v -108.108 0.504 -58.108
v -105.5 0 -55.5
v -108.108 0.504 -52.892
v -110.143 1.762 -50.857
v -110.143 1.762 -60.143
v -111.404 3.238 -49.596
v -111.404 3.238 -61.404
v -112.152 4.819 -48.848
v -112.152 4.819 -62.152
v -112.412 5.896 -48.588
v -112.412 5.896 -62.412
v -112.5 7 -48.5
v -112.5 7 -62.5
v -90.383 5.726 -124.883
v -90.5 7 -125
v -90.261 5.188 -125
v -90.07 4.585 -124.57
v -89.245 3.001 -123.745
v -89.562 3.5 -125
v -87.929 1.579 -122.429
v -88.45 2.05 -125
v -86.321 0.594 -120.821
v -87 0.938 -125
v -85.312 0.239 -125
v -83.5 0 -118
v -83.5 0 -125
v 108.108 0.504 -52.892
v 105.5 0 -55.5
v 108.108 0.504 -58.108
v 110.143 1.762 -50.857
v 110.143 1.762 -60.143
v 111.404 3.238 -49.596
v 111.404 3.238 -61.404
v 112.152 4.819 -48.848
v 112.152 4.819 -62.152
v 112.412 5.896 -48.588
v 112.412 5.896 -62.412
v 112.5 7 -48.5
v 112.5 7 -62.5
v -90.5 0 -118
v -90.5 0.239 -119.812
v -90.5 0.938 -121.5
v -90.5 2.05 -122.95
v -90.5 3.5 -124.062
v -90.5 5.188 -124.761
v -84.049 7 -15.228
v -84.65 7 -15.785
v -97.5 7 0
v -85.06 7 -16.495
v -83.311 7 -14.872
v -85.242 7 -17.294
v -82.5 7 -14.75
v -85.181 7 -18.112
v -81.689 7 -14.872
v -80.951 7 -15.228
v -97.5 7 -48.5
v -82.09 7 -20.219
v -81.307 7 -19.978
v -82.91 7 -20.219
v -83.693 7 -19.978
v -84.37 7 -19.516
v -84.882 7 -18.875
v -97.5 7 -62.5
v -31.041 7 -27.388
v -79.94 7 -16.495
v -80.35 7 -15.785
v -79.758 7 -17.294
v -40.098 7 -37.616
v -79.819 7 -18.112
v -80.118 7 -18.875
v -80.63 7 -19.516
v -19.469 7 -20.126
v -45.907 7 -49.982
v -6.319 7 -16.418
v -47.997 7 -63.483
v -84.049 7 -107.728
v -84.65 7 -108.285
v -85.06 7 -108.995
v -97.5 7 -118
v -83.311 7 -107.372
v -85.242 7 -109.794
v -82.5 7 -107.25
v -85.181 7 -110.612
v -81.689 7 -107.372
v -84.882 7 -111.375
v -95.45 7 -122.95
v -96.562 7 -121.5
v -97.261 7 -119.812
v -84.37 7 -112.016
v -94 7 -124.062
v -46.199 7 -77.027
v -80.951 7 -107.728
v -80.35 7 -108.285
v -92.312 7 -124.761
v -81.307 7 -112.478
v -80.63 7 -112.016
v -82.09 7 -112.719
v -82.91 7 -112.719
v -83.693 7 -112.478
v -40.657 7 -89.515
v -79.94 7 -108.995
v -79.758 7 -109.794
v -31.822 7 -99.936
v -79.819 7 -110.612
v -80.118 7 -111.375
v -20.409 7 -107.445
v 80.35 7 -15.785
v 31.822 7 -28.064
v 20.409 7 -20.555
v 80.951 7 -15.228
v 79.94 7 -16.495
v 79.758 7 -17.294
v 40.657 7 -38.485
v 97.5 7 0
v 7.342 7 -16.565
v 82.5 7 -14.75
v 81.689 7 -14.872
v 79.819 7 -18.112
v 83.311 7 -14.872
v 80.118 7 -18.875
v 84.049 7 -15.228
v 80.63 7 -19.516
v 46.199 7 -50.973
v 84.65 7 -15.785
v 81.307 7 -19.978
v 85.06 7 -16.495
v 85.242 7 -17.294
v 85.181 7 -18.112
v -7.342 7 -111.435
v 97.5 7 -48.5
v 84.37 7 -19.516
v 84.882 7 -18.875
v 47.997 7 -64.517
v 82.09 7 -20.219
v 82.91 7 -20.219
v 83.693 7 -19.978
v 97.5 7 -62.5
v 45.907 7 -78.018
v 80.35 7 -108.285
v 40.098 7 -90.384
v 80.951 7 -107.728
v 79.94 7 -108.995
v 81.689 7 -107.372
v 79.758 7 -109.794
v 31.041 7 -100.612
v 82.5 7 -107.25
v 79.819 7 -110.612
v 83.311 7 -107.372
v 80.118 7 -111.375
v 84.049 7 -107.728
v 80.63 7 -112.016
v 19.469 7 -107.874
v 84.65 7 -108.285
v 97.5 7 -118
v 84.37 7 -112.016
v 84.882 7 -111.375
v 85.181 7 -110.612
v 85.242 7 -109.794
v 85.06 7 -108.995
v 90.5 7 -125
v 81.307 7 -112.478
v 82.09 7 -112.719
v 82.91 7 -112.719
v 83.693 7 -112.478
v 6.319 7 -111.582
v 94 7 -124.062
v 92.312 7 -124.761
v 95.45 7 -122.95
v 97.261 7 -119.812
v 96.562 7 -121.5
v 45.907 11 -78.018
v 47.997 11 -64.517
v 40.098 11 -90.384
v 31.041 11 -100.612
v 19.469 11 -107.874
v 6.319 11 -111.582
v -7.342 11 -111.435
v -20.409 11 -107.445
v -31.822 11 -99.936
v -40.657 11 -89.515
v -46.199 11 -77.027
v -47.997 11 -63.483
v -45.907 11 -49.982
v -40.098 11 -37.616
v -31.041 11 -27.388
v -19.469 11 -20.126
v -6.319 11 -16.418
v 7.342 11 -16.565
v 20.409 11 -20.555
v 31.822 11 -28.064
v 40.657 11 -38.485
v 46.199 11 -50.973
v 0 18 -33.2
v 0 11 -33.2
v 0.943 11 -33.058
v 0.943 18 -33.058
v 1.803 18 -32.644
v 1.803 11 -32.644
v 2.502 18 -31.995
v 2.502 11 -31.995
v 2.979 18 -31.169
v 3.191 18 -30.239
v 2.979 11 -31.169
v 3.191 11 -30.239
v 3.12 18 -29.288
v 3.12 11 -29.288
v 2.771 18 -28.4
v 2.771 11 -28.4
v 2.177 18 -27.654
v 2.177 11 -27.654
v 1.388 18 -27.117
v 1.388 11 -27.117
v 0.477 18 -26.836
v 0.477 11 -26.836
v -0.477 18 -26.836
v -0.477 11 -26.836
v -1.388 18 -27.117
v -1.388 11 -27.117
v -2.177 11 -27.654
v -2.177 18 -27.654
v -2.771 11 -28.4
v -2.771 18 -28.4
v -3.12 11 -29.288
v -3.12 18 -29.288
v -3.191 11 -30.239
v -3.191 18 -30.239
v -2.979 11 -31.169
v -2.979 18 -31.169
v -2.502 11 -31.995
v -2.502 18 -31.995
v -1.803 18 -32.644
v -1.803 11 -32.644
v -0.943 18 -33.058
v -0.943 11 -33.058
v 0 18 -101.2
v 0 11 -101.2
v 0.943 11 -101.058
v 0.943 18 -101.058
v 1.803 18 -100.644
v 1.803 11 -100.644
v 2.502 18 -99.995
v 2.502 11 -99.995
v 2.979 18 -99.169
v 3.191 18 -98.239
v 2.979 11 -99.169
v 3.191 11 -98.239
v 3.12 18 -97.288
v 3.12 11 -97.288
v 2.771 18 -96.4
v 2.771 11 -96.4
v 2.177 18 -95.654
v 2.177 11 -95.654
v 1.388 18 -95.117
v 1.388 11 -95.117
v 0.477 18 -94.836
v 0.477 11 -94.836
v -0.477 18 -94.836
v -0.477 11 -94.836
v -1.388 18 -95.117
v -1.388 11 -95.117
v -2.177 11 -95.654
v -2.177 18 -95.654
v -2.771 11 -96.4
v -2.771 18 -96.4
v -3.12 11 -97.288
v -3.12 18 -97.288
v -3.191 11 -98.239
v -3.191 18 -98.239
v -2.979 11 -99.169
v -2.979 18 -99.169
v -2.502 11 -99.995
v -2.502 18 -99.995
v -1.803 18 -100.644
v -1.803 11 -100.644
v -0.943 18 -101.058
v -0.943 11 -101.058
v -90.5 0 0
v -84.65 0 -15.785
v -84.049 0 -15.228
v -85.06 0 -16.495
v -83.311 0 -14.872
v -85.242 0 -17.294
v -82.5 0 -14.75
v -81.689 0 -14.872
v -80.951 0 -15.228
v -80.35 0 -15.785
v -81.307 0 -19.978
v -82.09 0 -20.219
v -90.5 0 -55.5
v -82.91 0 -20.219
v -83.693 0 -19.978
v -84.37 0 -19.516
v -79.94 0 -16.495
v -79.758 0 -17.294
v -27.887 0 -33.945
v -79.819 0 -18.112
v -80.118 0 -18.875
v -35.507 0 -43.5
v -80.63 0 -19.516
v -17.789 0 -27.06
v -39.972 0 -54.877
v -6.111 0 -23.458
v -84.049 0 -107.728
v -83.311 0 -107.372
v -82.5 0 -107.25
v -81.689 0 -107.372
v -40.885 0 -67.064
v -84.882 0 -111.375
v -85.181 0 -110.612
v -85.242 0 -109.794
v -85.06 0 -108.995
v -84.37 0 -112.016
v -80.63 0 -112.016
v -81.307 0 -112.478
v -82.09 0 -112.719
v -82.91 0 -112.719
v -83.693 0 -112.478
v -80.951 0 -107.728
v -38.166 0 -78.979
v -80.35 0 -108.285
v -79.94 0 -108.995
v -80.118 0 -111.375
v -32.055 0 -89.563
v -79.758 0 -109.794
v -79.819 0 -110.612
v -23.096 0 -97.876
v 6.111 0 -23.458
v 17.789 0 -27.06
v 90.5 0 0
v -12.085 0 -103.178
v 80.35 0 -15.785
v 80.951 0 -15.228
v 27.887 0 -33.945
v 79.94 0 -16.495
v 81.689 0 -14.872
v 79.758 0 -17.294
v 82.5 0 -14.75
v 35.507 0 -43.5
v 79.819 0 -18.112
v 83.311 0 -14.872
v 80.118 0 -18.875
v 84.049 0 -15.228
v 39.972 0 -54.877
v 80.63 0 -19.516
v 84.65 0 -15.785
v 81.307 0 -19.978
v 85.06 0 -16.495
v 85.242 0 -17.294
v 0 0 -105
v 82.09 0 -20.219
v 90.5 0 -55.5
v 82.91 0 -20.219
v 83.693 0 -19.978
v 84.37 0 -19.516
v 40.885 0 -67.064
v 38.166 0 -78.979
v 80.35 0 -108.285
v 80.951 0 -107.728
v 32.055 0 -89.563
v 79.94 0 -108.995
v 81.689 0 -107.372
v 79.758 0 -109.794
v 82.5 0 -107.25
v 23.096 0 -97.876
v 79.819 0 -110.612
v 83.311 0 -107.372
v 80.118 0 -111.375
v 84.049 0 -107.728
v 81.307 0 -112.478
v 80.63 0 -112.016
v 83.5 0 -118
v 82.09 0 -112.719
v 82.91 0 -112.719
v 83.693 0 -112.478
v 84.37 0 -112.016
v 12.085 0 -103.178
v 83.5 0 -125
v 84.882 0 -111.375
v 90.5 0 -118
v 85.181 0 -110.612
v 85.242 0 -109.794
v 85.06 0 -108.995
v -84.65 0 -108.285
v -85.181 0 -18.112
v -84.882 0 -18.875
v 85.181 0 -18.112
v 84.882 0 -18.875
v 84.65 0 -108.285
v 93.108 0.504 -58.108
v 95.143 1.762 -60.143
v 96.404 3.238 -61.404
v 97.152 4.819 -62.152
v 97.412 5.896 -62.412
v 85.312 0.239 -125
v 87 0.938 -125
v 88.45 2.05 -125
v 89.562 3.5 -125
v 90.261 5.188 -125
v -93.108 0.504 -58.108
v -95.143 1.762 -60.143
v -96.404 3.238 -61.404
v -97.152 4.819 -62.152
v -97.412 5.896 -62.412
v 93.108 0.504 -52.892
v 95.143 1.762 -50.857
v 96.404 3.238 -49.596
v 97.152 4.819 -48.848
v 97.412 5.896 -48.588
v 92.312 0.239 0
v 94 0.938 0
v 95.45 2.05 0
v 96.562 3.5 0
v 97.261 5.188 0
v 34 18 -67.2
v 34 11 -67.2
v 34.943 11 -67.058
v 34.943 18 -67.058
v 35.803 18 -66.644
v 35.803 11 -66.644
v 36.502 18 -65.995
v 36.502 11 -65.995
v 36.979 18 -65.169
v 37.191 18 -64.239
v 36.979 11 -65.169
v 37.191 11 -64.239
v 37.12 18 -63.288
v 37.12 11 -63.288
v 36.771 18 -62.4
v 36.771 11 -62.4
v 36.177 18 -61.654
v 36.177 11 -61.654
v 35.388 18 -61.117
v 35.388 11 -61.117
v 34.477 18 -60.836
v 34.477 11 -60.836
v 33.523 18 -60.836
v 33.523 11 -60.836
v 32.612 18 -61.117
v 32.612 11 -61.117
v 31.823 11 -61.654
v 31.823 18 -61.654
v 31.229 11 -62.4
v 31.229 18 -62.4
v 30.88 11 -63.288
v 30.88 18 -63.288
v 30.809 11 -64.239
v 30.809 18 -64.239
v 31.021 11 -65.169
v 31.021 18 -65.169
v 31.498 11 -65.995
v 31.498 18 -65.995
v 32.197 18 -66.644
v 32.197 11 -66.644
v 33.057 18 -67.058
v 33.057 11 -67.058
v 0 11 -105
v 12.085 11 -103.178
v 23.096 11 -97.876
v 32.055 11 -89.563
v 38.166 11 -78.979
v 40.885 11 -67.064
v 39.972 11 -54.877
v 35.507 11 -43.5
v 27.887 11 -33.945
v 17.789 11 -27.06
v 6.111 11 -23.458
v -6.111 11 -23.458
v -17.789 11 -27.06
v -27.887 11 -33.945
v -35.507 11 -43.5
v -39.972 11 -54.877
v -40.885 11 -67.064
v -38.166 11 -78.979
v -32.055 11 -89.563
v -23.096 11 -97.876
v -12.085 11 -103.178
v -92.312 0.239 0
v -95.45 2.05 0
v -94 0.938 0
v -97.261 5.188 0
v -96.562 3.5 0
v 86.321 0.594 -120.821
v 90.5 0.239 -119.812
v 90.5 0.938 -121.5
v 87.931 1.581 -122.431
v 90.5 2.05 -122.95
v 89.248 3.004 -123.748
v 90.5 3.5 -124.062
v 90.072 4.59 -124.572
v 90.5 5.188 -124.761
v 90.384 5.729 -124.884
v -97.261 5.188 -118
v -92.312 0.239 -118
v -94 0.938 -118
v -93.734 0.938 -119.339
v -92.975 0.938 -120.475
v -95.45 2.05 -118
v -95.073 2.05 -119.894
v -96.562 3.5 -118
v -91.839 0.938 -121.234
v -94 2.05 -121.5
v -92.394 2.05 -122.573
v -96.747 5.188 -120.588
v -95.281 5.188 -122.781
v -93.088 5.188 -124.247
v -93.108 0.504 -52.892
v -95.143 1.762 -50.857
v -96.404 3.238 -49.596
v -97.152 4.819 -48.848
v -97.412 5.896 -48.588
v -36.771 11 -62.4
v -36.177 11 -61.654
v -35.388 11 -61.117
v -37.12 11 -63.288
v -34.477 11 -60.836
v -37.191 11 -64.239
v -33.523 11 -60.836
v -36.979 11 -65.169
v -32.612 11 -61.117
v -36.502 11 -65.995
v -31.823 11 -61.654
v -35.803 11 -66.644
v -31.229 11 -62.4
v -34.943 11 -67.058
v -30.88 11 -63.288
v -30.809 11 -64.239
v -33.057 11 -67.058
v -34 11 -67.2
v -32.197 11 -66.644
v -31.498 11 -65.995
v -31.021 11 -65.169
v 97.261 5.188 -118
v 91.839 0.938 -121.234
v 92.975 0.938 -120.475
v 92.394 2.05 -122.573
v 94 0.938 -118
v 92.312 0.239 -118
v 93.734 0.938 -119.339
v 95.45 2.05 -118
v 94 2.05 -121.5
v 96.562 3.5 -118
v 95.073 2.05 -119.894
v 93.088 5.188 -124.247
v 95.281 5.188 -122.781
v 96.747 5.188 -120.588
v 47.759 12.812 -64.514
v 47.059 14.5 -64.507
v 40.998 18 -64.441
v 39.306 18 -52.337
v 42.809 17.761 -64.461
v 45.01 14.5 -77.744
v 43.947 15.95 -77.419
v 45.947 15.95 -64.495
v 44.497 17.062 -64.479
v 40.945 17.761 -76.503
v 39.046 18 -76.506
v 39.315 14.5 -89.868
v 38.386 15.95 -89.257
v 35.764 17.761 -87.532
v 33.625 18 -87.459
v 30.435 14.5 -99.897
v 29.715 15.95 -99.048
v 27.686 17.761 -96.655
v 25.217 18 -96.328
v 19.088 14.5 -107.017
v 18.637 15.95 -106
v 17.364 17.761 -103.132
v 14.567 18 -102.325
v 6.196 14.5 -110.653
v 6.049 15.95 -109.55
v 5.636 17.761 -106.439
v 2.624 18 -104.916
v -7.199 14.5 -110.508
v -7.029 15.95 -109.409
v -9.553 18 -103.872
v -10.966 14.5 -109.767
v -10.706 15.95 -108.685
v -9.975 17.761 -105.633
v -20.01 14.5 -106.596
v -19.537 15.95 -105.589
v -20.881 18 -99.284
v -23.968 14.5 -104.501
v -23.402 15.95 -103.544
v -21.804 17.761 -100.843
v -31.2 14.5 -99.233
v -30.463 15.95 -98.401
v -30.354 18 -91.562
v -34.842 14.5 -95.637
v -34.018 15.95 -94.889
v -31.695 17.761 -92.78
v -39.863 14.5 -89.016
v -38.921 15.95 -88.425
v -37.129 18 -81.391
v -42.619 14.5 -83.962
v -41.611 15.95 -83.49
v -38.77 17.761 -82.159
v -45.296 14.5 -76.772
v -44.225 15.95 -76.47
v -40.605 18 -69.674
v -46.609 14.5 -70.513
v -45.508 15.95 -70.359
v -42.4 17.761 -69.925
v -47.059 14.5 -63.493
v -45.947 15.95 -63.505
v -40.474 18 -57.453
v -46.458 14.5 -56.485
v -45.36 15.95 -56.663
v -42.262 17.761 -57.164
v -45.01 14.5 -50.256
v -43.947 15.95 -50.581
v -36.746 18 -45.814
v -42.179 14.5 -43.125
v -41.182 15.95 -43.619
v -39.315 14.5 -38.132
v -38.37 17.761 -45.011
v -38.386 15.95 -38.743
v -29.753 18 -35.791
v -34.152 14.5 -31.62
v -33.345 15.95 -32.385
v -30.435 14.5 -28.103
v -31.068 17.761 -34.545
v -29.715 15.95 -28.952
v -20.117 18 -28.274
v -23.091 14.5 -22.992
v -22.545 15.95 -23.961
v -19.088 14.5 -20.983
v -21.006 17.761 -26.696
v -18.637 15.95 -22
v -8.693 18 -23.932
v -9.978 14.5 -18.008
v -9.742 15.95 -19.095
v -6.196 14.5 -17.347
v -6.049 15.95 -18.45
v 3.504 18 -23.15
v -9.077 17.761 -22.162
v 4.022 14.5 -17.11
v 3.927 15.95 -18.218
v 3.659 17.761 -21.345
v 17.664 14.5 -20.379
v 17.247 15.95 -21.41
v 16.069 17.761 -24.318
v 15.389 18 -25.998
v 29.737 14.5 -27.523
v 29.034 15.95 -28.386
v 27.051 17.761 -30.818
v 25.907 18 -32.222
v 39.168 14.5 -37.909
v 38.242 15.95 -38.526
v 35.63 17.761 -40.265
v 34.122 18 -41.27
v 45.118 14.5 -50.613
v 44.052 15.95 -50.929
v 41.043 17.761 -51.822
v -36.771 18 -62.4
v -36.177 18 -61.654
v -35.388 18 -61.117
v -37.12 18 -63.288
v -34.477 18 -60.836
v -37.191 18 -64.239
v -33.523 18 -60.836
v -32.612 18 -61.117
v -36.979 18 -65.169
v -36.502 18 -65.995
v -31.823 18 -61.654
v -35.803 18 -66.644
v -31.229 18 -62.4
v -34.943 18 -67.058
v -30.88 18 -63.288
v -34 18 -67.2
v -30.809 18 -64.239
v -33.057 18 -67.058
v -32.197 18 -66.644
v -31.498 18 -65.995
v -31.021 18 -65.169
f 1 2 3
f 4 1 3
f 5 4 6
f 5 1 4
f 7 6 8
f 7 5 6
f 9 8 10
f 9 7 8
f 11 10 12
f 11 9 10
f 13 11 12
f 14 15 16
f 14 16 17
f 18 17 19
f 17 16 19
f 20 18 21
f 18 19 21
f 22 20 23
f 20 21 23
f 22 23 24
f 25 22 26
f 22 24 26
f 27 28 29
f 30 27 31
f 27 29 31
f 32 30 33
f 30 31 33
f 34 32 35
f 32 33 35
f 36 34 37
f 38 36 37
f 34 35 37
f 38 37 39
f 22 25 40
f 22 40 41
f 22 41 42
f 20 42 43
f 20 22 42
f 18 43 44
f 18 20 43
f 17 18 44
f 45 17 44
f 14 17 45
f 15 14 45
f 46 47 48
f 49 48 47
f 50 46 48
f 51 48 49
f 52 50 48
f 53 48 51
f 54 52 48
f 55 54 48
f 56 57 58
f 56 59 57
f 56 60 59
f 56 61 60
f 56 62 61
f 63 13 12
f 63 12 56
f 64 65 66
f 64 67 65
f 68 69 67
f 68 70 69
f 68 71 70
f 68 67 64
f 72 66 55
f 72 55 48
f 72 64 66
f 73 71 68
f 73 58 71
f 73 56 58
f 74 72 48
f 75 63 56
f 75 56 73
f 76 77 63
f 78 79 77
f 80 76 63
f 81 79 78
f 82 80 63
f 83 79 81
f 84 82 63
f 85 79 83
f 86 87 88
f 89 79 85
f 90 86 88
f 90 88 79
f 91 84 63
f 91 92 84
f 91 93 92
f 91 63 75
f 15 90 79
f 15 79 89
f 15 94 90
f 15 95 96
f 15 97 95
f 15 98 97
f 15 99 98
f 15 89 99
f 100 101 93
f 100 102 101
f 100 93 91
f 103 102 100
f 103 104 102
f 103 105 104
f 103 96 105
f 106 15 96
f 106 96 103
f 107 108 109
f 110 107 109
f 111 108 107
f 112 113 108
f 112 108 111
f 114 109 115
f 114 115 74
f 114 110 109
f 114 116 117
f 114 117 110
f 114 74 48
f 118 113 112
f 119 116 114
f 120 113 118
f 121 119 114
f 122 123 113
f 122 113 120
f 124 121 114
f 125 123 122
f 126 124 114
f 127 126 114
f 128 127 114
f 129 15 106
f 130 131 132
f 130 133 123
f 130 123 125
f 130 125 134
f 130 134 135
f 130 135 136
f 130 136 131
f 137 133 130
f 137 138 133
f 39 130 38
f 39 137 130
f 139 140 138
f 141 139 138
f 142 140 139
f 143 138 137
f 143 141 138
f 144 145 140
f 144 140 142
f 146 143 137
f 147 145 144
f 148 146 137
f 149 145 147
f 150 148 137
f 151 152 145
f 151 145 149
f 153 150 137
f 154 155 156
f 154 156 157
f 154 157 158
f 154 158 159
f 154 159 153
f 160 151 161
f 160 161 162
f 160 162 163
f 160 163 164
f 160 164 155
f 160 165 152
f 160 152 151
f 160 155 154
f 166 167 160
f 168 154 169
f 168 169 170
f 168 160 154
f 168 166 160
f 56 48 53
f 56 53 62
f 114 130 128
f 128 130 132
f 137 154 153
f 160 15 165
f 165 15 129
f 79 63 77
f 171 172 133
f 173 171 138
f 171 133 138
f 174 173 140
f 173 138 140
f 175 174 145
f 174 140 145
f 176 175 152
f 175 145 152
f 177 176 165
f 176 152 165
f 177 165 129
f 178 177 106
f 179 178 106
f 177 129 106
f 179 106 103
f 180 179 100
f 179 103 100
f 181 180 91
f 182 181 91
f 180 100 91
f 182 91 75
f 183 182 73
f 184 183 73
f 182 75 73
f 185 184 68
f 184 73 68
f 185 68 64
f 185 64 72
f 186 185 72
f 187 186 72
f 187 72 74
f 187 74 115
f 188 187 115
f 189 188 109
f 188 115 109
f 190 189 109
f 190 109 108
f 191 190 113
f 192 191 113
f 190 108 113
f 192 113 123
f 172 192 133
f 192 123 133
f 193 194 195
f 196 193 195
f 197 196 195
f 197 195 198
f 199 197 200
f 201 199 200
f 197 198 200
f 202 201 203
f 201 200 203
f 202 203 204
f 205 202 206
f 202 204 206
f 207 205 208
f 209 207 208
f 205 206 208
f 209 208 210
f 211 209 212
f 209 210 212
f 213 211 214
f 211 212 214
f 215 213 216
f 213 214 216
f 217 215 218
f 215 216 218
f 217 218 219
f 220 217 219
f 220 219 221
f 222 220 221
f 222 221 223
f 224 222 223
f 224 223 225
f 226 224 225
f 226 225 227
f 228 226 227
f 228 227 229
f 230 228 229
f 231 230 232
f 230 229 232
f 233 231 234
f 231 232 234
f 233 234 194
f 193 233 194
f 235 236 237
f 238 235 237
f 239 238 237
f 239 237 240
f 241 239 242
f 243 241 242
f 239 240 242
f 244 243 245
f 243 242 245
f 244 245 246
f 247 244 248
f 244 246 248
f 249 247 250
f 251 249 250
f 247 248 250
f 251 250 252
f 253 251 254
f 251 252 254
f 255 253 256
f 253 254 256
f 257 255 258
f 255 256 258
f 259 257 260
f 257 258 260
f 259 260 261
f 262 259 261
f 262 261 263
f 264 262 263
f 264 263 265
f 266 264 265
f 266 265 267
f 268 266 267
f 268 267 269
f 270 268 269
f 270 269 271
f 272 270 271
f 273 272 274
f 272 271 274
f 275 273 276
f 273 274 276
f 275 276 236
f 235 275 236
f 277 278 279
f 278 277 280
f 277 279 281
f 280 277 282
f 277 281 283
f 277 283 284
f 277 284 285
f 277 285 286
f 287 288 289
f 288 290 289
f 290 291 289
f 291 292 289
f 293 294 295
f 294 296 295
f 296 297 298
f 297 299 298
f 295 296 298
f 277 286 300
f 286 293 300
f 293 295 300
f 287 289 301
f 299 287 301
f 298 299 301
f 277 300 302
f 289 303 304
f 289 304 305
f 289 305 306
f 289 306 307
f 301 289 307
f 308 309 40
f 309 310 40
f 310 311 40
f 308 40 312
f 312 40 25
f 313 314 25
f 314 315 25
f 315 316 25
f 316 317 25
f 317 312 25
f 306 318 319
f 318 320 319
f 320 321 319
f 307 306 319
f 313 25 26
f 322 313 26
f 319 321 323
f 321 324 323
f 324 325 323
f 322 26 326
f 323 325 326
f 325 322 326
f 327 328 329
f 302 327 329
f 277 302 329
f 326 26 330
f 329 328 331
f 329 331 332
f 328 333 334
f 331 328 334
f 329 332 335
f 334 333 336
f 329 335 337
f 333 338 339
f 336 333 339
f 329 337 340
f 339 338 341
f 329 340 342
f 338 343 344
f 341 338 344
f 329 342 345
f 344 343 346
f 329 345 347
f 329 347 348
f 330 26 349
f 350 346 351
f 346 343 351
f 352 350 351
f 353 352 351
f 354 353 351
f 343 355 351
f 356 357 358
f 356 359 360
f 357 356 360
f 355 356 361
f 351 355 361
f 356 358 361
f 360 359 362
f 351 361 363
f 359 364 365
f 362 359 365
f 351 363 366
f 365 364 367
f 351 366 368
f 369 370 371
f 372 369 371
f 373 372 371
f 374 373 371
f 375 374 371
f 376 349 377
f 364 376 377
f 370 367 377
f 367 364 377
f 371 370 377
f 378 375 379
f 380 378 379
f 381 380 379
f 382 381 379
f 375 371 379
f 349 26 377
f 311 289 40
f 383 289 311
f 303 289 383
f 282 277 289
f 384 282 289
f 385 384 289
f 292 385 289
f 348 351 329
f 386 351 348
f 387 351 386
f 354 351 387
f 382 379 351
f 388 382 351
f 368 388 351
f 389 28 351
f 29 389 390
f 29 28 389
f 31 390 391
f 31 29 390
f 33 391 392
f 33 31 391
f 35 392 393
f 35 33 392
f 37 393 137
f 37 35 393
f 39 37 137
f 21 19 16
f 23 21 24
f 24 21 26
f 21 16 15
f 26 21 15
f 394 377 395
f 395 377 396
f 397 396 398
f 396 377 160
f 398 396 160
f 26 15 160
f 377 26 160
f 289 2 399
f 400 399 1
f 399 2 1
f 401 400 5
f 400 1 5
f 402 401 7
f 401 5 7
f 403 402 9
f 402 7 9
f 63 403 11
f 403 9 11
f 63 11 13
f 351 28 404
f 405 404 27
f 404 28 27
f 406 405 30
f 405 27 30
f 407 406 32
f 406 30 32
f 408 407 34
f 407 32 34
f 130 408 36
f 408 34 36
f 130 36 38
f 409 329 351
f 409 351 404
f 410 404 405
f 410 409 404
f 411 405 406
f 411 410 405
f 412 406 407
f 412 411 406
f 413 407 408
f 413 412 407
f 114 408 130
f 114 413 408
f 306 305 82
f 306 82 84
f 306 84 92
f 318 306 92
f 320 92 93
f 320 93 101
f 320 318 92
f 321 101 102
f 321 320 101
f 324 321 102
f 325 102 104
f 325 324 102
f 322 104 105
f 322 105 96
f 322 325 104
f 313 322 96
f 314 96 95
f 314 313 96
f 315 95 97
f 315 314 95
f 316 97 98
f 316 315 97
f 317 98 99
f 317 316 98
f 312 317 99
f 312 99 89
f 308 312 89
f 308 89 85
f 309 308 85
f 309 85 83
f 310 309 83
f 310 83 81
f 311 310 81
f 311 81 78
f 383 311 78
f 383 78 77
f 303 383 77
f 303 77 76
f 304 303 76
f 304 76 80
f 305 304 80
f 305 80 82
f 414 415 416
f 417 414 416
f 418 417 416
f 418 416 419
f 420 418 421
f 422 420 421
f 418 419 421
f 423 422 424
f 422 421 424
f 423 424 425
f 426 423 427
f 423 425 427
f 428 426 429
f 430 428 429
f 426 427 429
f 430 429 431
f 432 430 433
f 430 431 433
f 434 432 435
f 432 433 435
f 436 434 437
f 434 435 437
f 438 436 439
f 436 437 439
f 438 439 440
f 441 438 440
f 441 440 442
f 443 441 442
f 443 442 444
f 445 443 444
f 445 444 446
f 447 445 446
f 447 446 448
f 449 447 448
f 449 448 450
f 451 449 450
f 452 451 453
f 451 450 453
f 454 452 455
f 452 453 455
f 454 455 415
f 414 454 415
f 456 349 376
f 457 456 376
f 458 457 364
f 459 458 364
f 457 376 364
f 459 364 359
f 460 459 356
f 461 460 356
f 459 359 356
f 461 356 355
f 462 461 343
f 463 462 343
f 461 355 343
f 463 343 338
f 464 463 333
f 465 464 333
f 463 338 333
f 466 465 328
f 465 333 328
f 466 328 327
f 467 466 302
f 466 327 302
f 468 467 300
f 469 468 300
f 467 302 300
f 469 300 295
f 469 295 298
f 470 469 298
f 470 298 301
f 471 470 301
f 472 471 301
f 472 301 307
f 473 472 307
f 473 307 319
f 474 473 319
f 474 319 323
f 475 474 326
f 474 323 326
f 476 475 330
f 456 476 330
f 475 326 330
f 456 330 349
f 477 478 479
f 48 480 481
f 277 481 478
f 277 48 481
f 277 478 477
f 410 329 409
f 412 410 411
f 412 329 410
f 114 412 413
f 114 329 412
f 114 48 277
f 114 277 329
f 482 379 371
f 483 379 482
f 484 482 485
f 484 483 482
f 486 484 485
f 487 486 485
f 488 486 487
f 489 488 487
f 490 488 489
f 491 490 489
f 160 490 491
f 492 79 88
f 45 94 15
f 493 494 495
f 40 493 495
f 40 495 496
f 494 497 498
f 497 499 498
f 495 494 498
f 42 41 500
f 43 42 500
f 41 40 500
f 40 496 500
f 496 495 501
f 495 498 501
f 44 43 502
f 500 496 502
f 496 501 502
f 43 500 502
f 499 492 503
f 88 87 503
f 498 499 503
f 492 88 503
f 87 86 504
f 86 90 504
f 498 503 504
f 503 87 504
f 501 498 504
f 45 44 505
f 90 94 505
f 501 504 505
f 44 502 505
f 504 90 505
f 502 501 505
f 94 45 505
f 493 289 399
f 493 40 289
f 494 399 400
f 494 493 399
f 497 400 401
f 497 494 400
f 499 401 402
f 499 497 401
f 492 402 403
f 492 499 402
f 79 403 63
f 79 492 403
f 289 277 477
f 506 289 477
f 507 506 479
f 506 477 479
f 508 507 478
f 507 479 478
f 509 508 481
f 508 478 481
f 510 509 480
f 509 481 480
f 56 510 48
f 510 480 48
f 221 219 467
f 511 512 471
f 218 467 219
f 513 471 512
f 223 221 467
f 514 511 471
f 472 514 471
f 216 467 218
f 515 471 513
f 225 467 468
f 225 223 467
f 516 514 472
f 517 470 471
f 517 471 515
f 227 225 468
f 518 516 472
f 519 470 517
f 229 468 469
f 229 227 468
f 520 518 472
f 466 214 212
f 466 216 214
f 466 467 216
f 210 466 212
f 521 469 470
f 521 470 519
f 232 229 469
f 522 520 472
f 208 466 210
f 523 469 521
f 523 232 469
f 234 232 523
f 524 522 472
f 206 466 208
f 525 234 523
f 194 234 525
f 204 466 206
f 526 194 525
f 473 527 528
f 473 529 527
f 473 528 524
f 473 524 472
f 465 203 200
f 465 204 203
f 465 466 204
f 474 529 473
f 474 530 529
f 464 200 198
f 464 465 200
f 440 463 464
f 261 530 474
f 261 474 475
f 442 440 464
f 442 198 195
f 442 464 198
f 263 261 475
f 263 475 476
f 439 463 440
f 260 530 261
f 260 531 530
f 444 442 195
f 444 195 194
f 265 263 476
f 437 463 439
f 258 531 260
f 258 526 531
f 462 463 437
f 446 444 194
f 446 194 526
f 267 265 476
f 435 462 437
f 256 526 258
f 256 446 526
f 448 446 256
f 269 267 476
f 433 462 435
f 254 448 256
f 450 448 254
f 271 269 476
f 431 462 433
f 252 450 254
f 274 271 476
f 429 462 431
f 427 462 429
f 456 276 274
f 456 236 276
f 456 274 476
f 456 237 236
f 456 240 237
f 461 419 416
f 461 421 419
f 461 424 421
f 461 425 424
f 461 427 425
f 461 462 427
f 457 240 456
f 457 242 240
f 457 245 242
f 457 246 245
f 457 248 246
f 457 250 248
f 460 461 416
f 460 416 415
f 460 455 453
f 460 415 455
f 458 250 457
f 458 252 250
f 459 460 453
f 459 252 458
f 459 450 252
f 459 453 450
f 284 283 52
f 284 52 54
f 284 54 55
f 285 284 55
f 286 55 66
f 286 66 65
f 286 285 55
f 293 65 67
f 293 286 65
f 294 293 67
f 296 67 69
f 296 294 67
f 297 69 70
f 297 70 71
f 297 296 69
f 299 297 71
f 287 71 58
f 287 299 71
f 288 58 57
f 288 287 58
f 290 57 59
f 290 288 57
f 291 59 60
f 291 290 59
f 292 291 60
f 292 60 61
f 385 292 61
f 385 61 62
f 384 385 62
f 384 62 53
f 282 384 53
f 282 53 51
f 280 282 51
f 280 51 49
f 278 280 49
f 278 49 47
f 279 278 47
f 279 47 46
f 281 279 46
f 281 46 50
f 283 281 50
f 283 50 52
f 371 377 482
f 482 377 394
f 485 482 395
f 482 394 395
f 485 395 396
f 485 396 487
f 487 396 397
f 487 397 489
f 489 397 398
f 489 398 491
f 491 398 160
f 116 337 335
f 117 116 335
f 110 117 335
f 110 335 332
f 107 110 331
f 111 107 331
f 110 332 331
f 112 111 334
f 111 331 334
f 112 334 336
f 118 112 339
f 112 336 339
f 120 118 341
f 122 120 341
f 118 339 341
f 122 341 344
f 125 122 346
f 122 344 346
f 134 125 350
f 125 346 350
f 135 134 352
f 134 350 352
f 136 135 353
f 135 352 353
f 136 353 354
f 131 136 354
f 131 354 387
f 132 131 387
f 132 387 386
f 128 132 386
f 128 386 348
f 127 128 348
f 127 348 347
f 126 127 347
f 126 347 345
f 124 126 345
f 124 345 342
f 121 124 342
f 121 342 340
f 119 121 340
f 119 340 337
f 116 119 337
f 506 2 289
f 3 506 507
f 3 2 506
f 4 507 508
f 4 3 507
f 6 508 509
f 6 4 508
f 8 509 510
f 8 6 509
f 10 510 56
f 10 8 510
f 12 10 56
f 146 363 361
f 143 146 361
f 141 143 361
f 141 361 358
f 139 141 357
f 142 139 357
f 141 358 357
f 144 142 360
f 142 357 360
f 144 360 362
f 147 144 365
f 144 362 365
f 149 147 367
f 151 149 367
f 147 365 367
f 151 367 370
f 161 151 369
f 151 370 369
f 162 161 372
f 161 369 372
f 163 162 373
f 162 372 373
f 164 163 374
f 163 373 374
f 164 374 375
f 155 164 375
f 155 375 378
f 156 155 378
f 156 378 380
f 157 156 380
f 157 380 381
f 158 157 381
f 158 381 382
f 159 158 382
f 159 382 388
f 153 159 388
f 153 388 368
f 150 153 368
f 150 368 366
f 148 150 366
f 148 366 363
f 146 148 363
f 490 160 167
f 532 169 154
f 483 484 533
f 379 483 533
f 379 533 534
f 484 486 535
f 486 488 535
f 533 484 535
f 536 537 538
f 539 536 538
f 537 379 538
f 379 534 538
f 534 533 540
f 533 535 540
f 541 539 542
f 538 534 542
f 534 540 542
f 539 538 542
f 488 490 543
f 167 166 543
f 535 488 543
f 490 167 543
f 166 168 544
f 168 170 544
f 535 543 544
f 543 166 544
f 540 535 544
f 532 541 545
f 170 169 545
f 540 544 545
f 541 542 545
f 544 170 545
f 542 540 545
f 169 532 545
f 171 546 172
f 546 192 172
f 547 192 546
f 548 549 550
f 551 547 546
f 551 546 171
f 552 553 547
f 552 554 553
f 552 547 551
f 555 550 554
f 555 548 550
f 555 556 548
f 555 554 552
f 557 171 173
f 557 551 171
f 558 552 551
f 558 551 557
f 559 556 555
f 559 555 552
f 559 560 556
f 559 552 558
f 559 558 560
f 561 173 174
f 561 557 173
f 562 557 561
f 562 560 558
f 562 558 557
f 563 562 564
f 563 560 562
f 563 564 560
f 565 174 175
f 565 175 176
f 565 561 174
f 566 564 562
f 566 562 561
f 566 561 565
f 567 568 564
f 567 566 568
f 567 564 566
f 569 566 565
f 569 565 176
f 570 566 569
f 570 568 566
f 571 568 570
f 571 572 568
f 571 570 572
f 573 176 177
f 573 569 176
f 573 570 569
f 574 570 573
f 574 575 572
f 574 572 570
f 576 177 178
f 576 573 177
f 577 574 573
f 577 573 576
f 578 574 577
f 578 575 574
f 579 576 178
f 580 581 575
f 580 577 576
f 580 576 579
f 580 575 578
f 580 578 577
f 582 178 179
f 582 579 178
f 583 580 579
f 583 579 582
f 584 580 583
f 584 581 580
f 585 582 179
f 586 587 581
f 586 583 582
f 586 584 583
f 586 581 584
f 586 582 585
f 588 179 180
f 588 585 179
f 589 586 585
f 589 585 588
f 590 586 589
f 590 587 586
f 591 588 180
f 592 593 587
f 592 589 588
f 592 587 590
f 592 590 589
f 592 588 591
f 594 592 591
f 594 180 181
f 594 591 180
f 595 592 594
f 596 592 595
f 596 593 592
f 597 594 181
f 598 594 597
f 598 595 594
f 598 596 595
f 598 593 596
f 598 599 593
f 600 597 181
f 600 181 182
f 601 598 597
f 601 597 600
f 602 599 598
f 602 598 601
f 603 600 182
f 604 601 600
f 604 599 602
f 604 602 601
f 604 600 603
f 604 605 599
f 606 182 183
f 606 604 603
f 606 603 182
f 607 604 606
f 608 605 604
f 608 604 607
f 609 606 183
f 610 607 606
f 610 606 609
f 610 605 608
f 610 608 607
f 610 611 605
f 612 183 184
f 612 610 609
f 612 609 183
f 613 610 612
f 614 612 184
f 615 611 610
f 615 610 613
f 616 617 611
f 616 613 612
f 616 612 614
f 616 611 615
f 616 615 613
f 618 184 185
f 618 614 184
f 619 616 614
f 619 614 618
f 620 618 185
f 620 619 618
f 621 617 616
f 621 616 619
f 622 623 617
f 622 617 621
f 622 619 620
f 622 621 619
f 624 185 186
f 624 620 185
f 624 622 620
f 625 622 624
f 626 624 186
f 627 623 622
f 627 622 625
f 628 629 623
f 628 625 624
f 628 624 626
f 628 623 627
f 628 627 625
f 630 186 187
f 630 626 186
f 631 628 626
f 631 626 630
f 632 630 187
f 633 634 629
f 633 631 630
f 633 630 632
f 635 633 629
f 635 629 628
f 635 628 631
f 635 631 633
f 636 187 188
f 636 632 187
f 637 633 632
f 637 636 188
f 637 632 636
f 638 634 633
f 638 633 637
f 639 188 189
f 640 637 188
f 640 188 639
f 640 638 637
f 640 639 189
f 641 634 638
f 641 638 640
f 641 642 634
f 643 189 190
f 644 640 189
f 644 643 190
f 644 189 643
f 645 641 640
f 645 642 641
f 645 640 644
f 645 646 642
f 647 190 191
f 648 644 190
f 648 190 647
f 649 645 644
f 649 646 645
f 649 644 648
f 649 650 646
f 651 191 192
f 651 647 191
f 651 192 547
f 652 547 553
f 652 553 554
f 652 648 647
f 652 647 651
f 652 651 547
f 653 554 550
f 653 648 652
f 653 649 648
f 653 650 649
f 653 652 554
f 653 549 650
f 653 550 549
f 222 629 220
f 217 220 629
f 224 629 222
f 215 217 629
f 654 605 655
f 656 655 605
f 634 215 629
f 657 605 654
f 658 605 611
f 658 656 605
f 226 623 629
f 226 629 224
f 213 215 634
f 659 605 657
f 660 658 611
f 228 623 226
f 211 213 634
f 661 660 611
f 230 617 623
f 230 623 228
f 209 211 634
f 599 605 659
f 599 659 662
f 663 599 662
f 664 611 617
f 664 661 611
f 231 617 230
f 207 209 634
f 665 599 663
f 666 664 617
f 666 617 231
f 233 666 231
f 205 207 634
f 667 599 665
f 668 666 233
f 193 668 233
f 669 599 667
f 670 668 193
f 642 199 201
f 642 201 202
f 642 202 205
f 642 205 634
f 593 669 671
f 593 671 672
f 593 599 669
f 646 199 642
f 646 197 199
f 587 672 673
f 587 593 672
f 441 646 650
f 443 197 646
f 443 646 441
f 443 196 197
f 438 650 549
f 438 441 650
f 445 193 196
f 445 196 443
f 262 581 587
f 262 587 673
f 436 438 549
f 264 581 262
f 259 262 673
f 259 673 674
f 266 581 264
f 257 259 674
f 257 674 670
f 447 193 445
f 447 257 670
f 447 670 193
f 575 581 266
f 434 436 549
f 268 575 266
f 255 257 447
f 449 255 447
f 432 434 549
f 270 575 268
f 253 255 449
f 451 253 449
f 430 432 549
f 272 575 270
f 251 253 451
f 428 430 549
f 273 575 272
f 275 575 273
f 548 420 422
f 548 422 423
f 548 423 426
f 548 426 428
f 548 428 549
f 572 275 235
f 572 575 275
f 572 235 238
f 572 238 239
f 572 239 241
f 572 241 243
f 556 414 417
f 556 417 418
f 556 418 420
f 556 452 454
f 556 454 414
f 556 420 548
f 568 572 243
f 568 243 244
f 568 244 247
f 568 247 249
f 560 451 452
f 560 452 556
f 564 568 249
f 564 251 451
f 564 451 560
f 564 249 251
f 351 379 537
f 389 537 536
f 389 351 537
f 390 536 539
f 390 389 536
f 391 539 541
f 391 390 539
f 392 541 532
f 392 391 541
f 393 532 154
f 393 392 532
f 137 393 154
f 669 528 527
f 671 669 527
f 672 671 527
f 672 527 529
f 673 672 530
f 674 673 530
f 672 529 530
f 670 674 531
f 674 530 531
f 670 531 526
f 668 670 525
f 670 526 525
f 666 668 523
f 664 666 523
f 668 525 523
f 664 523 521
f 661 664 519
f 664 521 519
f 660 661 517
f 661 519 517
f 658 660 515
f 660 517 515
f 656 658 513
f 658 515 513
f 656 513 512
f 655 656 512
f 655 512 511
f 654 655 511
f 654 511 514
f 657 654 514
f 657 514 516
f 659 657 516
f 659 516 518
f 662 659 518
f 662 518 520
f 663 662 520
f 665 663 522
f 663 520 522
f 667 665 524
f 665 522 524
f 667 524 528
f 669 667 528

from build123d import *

# Parameters (mm, degrees)
SKETCH2_W               = 195
SKETCH2_H               = 125
BOSS_EXTRUDE1_DEPTH     = 57
SKETCH3_W               = 181
SKETCH3_H               = 118
CUT_EXTRUDE1_DEPTH      = 50
BOSS_EXTRUDE2_DEPTH     = 15
CUT_EXTRUDE4_REACH      = 179.568
SKETCH7_R               = 2.75
SKETCH34_R              = 2
SKETCH34_W              = 22
SKETCH34_H              = 42
CUT_EXTRUDE8_DEPTH      = 7
MIRROR2_COPY_1_DEPTH    = 15
MIRROR2_COPY_2_REACH    = 179.568
MIRROR2_COPY_2_SKETCH_R = 2.75
MIRROR2_COPY_3_SKETCH_R = 2
MIRROR2_COPY_3_SKETCH_W = 22
MIRROR2_COPY_3_SKETCH_H = 42
MIRROR2_COPY_3_DEPTH    = 7
FILLET2_R               = 7
FILLET7_R               = 7
BOSS_EXTRUDE8_REACH     = 282.009
BOSS_EXTRUDE9_REACH     = 282.009
SKETCH29_W              = 460.325022979
SKETCH29_H              = 444.411594697
CUT_EXTRUDE5_DEPTH      = 50
SKETCH30_R              = 48
BOSS_EXTRUDE10_DEPTH    = 11
SKETCH31_R              = 41
CUT_EXTRUDE6_DEPTH      = 11
SKETCH32_R              = 3.2
CUT_EXTRUDE7_DEPTH      = 7
FILLET8_R               = 7
FILLET11_R              = 6.3
SKETCH37_W              = 42
SKETCH37_H              = 75
BOSS_EXTRUDE11_DEPTH    = 7
SKETCH39_W              = 259.645658498
SKETCH39_H              = 116.30884873
CUT_EXTRUDE9_DEPTH      = 125


with BuildPart() as part:
    # Sketch2 → Boss-Extrude1 (new body)
    with BuildSketch(Plane(origin=(0, 0, 0), x_dir=(1, 0, 0), z_dir=(0, 1, 0))):
        with Locations((0, -62.5)):
            Rectangle(SKETCH2_W, SKETCH2_H)
    boss_extrude1 = extrude(amount=BOSS_EXTRUDE1_DEPTH)

    # Sketch3 → Cut-Extrude1 (cut)
    with BuildSketch(Plane(origin=(0, 57, 0), x_dir=(1, 0, 0), z_dir=(0, 1, 0))):
        with Locations((0, -59)):
            Rectangle(SKETCH3_W, SKETCH3_H)
    cut_extrude1 = extrude(amount=-CUT_EXTRUDE1_DEPTH, mode=Mode.SUBTRACT)

    # Sketch5 → Boss-Extrude2 (add)
    with BuildSketch(Plane.ZY.offset(97.5)):
        Polygon((48.5, 7), (48.5, 0), (62.5, 0), (62.5, 57), (55.5, 57), (55.5, 7), align=None)
    boss_extrude2 = extrude(amount=BOSS_EXTRUDE2_DEPTH)

    # Sketch7 → Cut-Extrude4 (cut, up to next)
    with BuildSketch(Plane.XZ, mode=Mode.PRIVATE) as cut_extrude4_sk1:
        with Locations(Location((-82.5, 17.5, 0), (0, 0, 270))):
            Circle(SKETCH7_R)
    cut_extrude4_tool1 = extrude(cut_extrude4_sk1.sketch, amount=-CUT_EXTRUDE4_REACH, mode=Mode.PRIVATE) & part.part
    # Sketch7 → Cut-Extrude4 (cut, up to next)
    with BuildSketch(Plane.XZ, mode=Mode.PRIVATE) as cut_extrude4_sk2:
        with Locations(Location((-82.5, 110, 0), (0, 0, 270))):
            Circle(SKETCH7_R)
    cut_extrude4_tool2 = extrude(cut_extrude4_sk2.sketch, amount=-CUT_EXTRUDE4_REACH, mode=Mode.PRIVATE) & part.part
    cut_extrude4_1 = cut_extrude4_tool1.solids().sort_by_distance((-82.5, 0, 17.5))[0]
    add(cut_extrude4_1, mode=Mode.SUBTRACT)
    cut_extrude4_2 = cut_extrude4_tool2.solids().sort_by_distance((-82.5, 0, 110))[0]
    add(cut_extrude4_2, mode=Mode.SUBTRACT)
    cut_extrude4 = cut_extrude4_1 + cut_extrude4_2  # Cut-Extrude4 as one shape, for the pattern or mirror that repeats it

    # Sketch34 → Cut-Extrude8 (cut)
    with BuildSketch(Plane.XZ):
        with Locations(Location((-57.3, 88.85, 0), (0, 0, 270))):
            Circle(SKETCH34_R)
        with Locations(Location((-67.3, 88.85, 0), (0, 0, 270))):
            Circle(SKETCH34_R)
        with Locations(Location((-78.45, 63.75, 0), (0, 0, 270))):
            Circle(SKETCH34_R)
        with Locations(Location((-46.15, 63.75, 0), (0, 0, 270))):
            Circle(SKETCH34_R)
        with Locations(Location((-57.3, 38.65, 0), (0, 0, 270))):
            Circle(SKETCH34_R)
        with Locations(Location((-67.3, 38.65, 0), (0, 0, 270))):
            Circle(SKETCH34_R)
        with Locations((-62.3, 63.75)):
            Rectangle(SKETCH34_W, SKETCH34_H)
    cut_extrude8 = extrude(amount=-CUT_EXTRUDE8_DEPTH, mode=Mode.SUBTRACT)

    # Mirror1: Boss-Extrude2, Cut-Extrude4, Cut-Extrude8 across plane
    add(boss_extrude2.mirror(Plane(origin=(0, 0, 0), x_dir=(0, 0, 1), z_dir=(1, 0, 0))))
    add(cut_extrude4.mirror(Plane(origin=(0, 0, 0), x_dir=(0, 0, 1), z_dir=(1, 0, 0))), mode=Mode.SUBTRACT)
    add(cut_extrude8.mirror(Plane(origin=(0, 0, 0), x_dir=(0, 0, 1), z_dir=(1, 0, 0))), mode=Mode.SUBTRACT)

    # Mirror2: Boss-Extrude1, Cut-Extrude1, Boss-Extrude2, Cut-Extrude4, Cut-Extrude8 across plane
    add(boss_extrude1.mirror(Plane.XY))
    add(cut_extrude1.mirror(Plane.XY), mode=Mode.SUBTRACT)
    add(boss_extrude2.mirror(Plane.XY))
    add(cut_extrude4.mirror(Plane.XY), mode=Mode.SUBTRACT)
    add(cut_extrude8.mirror(Plane.XY), mode=Mode.SUBTRACT)

    # Mirror2 copy 1 sketch → Mirror2 copy 1 (add)
    with BuildSketch(Plane(origin=(97.5, 0, 0), x_dir=(0, 0, -1), z_dir=(1, 0, 0))):
        Polygon((48.5, 7), (48.5, 0), (62.5, 0), (62.5, 57), (55.5, 57), (55.5, 7), align=None)
    extrude(amount=MIRROR2_COPY_1_DEPTH)

    # Mirror2 copy 2 sketch → Mirror2 copy 2 (cut, up to next)
    with BuildSketch(Plane(origin=(0, 0, 0), x_dir=(-1, 0, 0), z_dir=(0, -1, 0)), mode=Mode.PRIVATE) as mirror2_copy_2_sk1:
        with Locations(Location((-82.5, 17.5, 0), (0, 0, 270))):
            Circle(MIRROR2_COPY_2_SKETCH_R)
    mirror2_copy_2_tool1 = extrude(mirror2_copy_2_sk1.sketch, amount=-MIRROR2_COPY_2_REACH, mode=Mode.PRIVATE) & part.part
    # Mirror2 copy 2 sketch → Mirror2 copy 2 (cut, up to next)
    with BuildSketch(Plane(origin=(0, 0, 0), x_dir=(-1, 0, 0), z_dir=(0, -1, 0)), mode=Mode.PRIVATE) as mirror2_copy_2_sk2:
        with Locations(Location((-82.5, 110, 0), (0, 0, 270))):
            Circle(MIRROR2_COPY_2_SKETCH_R)
    mirror2_copy_2_tool2 = extrude(mirror2_copy_2_sk2.sketch, amount=-MIRROR2_COPY_2_REACH, mode=Mode.PRIVATE) & part.part
    add(mirror2_copy_2_tool1.solids().sort_by_distance((82.5, 0, -17.5))[0], mode=Mode.SUBTRACT)
    add(mirror2_copy_2_tool2.solids().sort_by_distance((82.5, 0, -110))[0], mode=Mode.SUBTRACT)

    # Mirror2 copy 3 sketch → Mirror2 copy 3 (cut)
    with BuildSketch(Plane(origin=(0, 0, 0), x_dir=(-1, 0, 0), z_dir=(0, -1, 0))):
        with Locations(Location((-57.3, 88.85, 0), (0, 0, 270))):
            Circle(MIRROR2_COPY_3_SKETCH_R)
        with Locations(Location((-67.3, 88.85, 0), (0, 0, 270))):
            Circle(MIRROR2_COPY_3_SKETCH_R)
        with Locations(Location((-78.45, 63.75, 0), (0, 0, 270))):
            Circle(MIRROR2_COPY_3_SKETCH_R)
        with Locations(Location((-46.15, 63.75, 0), (0, 0, 270))):
            Circle(MIRROR2_COPY_3_SKETCH_R)
        with Locations(Location((-57.3, 38.65, 0), (0, 0, 270))):
            Circle(MIRROR2_COPY_3_SKETCH_R)
        with Locations(Location((-67.3, 38.65, 0), (0, 0, 270))):
            Circle(MIRROR2_COPY_3_SKETCH_R)
        with Locations((-62.3, 63.75)):
            Rectangle(MIRROR2_COPY_3_SKETCH_W, MIRROR2_COPY_3_SKETCH_H)
    extrude(amount=-MIRROR2_COPY_3_DEPTH, mode=Mode.SUBTRACT)

    # Fillet2
    fillet2_edges = [part.edges().sort_by_distance(p)[0] for p in [
        (-97.5, 28.5, -125),
        (97.5, 28.5, -125),
        (97.5, 28.5, 125),
        (-97.5, 28.5, 125),
    ]]
    fillet(fillet2_edges, radius=FILLET2_R)

    # Fillet7
    fillet7_edges = [part.edges().sort_by_distance(p)[0] for p in [
        (97.5, 0, 0),
        (-97.5, 0, 0),
        (97.5, 0, -90.25),
        (-97.5, 0, 90.25),
        (97.5, 0, 90.25),
        (-97.5, 0, -90.25),
        (0, 0, -125),
        (0, 0, 125),
        (112.5, 0, 55.5),
        (105, 0, 62.5),
        (105, 0, 48.5),
        (-112.5, 0, -55.5),
        (-105, 0, -62.5),
        (-105, 0, -48.5),
        (105, 0, -48.5),
        (105, 0, -62.5),
        (112.5, 0, -55.5),
        (-105, 0, 48.5),
        (-105, 0, 62.5),
        (-95.449747468, 0, 122.949747468),
        (-95.449747468, 0, -122.949747468),
        (95.449747468, 0, -122.949747468),
        (95.449747468, 0, 122.949747468),
        (-112.5, 0, 55.5),
    ]]
    fillet(fillet7_edges, radius=FILLET7_R - 0.0001)  # a hair under: the kernel refuses the full size

    # Sketch26 → Boss-Extrude8 (add, up to next)
    with BuildSketch(Plane.XY.offset(125), mode=Mode.PRIVATE) as boss_extrude8_sk1:
        with BuildLine():
            Line((-90.5, 7), (90.5, 7))
            ThreePointArc((90.5, 7), (88.449747468, 2.050252532), (83.5, 0))
            Line((83.5, 0), (-83.5, 0))
            ThreePointArc((-83.5, 0), (-88.449747468, 2.050252532), (-90.5, 7))
        make_face()
    boss_extrude8_tool1 = extrude(boss_extrude8_sk1.sketch, amount=-BOSS_EXTRUDE8_REACH, mode=Mode.PRIVATE) - part.part
    add(boss_extrude8_tool1.solids().sort_by_distance((0, 3.532685, 125))[0])

    # Sketch27 → Boss-Extrude9 (add, up to next)
    with BuildSketch(Plane(origin=(0, 0, -125), x_dir=(-1, 0, 0), z_dir=(0, 0, -1)), mode=Mode.PRIVATE) as boss_extrude9_sk1:
        with BuildLine():
            Line((-90.5, 7), (90.5, 7))
            ThreePointArc((90.5, 7), (88.449747468, 2.050252532), (83.5, 0))
            Line((83.5, 0), (-83.5, 0))
            ThreePointArc((-83.5, 0), (-88.449747468, 2.050252532), (-90.5, 7))
        make_face()
    boss_extrude9_tool1 = extrude(boss_extrude9_sk1.sketch, amount=-BOSS_EXTRUDE9_REACH, mode=Mode.PRIVATE) - part.part
    add(boss_extrude9_tool1.solids().sort_by_distance((0, 3.532685, -125))[0])

    # Sketch29 → Cut-Extrude5 (cut)
    with BuildSketch(Plane(origin=(0, 57, 0), x_dir=(1, 0, 0), z_dir=(0, 1, 0))):
        with Locations((1.552529588, 6.210118353)):
            Rectangle(SKETCH29_W, SKETCH29_H)
    extrude(amount=-CUT_EXTRUDE5_DEPTH, mode=Mode.SUBTRACT)

    # Sketch30 → Boss-Extrude10 (add)
    with BuildSketch(Plane(origin=(0, 7, 0), x_dir=(1, 0, 0), z_dir=(0, 1, 0))):
        with Locations(Location((0, 64, 0), (0, 0, 0.616739929))):
            Circle(SKETCH30_R)
    extrude(amount=BOSS_EXTRUDE10_DEPTH)

    # Sketch31 → Cut-Extrude6 (cut)
    with BuildSketch(Plane.XZ):
        with Locations(Location((0, -64, 0), (0, 0, 270))):
            Circle(SKETCH31_R)
    extrude(amount=-CUT_EXTRUDE6_DEPTH, mode=Mode.SUBTRACT)

    # Sketch32 → Cut-Extrude7 (cut)
    with BuildSketch(Plane.XZ.offset(-11)):
        with Locations(Location((0, -30, 0), (0, 0, 270))):
            Circle(SKETCH32_R)
        with Locations(Location((0, -98, 0), (0, 0, 270))):
            Circle(SKETCH32_R)
        with Locations(Location((34, -64, 0), (0, 0, 270))):
            Circle(SKETCH32_R)
        with Locations(Location((-34, -64, 0), (0, 0, 270))):
            Circle(SKETCH32_R)
    extrude(amount=-CUT_EXTRUDE7_DEPTH, mode=Mode.SUBTRACT)

    # Fillet8
    fillet8_edges = [part.edges().sort_by_distance(p)[0] for p in [
        (-47.997219225, 18, -63.483331143),
    ]]
    fillet(fillet8_edges, radius=FILLET8_R)

    # Fillet11
    fillet11_edges = [part.edges().sort_by_distance(p)[0] for p in [
        (73.3, 3.5, 84.75),
        (73.3, 3.5, 42.75),
        (51.3, 3.5, 42.75),
        (51.3, 3.5, 84.75),
        (-51.3, 3.5, 42.75),
        (-51.3, 3.5, 84.75),
        (-73.3, 3.5, 84.75),
        (-73.3, 3.5, 42.75),
    ]]
    fillet(fillet11_edges, radius=FILLET11_R)

    # Sketch37 → Boss-Extrude11 (add)
    with BuildSketch(Plane.XZ):
        with Locations((64.5, -62.5)):
            Rectangle(SKETCH37_W, SKETCH37_H)
        with Locations((-64.5, -62.5)):
            Rectangle(SKETCH37_W, SKETCH37_H)
    extrude(amount=-BOSS_EXTRUDE11_DEPTH)

    # Sketch39 → Cut-Extrude9 (cut)
    with BuildSketch(Plane.XY.offset(125)):
        with Locations((-5.095435278, 8.271148339)):
            Rectangle(SKETCH39_W, SKETCH39_H)
    extrude(amount=-CUT_EXTRUDE9_DEPTH, mode=Mode.SUBTRACT)


solid = part.part
